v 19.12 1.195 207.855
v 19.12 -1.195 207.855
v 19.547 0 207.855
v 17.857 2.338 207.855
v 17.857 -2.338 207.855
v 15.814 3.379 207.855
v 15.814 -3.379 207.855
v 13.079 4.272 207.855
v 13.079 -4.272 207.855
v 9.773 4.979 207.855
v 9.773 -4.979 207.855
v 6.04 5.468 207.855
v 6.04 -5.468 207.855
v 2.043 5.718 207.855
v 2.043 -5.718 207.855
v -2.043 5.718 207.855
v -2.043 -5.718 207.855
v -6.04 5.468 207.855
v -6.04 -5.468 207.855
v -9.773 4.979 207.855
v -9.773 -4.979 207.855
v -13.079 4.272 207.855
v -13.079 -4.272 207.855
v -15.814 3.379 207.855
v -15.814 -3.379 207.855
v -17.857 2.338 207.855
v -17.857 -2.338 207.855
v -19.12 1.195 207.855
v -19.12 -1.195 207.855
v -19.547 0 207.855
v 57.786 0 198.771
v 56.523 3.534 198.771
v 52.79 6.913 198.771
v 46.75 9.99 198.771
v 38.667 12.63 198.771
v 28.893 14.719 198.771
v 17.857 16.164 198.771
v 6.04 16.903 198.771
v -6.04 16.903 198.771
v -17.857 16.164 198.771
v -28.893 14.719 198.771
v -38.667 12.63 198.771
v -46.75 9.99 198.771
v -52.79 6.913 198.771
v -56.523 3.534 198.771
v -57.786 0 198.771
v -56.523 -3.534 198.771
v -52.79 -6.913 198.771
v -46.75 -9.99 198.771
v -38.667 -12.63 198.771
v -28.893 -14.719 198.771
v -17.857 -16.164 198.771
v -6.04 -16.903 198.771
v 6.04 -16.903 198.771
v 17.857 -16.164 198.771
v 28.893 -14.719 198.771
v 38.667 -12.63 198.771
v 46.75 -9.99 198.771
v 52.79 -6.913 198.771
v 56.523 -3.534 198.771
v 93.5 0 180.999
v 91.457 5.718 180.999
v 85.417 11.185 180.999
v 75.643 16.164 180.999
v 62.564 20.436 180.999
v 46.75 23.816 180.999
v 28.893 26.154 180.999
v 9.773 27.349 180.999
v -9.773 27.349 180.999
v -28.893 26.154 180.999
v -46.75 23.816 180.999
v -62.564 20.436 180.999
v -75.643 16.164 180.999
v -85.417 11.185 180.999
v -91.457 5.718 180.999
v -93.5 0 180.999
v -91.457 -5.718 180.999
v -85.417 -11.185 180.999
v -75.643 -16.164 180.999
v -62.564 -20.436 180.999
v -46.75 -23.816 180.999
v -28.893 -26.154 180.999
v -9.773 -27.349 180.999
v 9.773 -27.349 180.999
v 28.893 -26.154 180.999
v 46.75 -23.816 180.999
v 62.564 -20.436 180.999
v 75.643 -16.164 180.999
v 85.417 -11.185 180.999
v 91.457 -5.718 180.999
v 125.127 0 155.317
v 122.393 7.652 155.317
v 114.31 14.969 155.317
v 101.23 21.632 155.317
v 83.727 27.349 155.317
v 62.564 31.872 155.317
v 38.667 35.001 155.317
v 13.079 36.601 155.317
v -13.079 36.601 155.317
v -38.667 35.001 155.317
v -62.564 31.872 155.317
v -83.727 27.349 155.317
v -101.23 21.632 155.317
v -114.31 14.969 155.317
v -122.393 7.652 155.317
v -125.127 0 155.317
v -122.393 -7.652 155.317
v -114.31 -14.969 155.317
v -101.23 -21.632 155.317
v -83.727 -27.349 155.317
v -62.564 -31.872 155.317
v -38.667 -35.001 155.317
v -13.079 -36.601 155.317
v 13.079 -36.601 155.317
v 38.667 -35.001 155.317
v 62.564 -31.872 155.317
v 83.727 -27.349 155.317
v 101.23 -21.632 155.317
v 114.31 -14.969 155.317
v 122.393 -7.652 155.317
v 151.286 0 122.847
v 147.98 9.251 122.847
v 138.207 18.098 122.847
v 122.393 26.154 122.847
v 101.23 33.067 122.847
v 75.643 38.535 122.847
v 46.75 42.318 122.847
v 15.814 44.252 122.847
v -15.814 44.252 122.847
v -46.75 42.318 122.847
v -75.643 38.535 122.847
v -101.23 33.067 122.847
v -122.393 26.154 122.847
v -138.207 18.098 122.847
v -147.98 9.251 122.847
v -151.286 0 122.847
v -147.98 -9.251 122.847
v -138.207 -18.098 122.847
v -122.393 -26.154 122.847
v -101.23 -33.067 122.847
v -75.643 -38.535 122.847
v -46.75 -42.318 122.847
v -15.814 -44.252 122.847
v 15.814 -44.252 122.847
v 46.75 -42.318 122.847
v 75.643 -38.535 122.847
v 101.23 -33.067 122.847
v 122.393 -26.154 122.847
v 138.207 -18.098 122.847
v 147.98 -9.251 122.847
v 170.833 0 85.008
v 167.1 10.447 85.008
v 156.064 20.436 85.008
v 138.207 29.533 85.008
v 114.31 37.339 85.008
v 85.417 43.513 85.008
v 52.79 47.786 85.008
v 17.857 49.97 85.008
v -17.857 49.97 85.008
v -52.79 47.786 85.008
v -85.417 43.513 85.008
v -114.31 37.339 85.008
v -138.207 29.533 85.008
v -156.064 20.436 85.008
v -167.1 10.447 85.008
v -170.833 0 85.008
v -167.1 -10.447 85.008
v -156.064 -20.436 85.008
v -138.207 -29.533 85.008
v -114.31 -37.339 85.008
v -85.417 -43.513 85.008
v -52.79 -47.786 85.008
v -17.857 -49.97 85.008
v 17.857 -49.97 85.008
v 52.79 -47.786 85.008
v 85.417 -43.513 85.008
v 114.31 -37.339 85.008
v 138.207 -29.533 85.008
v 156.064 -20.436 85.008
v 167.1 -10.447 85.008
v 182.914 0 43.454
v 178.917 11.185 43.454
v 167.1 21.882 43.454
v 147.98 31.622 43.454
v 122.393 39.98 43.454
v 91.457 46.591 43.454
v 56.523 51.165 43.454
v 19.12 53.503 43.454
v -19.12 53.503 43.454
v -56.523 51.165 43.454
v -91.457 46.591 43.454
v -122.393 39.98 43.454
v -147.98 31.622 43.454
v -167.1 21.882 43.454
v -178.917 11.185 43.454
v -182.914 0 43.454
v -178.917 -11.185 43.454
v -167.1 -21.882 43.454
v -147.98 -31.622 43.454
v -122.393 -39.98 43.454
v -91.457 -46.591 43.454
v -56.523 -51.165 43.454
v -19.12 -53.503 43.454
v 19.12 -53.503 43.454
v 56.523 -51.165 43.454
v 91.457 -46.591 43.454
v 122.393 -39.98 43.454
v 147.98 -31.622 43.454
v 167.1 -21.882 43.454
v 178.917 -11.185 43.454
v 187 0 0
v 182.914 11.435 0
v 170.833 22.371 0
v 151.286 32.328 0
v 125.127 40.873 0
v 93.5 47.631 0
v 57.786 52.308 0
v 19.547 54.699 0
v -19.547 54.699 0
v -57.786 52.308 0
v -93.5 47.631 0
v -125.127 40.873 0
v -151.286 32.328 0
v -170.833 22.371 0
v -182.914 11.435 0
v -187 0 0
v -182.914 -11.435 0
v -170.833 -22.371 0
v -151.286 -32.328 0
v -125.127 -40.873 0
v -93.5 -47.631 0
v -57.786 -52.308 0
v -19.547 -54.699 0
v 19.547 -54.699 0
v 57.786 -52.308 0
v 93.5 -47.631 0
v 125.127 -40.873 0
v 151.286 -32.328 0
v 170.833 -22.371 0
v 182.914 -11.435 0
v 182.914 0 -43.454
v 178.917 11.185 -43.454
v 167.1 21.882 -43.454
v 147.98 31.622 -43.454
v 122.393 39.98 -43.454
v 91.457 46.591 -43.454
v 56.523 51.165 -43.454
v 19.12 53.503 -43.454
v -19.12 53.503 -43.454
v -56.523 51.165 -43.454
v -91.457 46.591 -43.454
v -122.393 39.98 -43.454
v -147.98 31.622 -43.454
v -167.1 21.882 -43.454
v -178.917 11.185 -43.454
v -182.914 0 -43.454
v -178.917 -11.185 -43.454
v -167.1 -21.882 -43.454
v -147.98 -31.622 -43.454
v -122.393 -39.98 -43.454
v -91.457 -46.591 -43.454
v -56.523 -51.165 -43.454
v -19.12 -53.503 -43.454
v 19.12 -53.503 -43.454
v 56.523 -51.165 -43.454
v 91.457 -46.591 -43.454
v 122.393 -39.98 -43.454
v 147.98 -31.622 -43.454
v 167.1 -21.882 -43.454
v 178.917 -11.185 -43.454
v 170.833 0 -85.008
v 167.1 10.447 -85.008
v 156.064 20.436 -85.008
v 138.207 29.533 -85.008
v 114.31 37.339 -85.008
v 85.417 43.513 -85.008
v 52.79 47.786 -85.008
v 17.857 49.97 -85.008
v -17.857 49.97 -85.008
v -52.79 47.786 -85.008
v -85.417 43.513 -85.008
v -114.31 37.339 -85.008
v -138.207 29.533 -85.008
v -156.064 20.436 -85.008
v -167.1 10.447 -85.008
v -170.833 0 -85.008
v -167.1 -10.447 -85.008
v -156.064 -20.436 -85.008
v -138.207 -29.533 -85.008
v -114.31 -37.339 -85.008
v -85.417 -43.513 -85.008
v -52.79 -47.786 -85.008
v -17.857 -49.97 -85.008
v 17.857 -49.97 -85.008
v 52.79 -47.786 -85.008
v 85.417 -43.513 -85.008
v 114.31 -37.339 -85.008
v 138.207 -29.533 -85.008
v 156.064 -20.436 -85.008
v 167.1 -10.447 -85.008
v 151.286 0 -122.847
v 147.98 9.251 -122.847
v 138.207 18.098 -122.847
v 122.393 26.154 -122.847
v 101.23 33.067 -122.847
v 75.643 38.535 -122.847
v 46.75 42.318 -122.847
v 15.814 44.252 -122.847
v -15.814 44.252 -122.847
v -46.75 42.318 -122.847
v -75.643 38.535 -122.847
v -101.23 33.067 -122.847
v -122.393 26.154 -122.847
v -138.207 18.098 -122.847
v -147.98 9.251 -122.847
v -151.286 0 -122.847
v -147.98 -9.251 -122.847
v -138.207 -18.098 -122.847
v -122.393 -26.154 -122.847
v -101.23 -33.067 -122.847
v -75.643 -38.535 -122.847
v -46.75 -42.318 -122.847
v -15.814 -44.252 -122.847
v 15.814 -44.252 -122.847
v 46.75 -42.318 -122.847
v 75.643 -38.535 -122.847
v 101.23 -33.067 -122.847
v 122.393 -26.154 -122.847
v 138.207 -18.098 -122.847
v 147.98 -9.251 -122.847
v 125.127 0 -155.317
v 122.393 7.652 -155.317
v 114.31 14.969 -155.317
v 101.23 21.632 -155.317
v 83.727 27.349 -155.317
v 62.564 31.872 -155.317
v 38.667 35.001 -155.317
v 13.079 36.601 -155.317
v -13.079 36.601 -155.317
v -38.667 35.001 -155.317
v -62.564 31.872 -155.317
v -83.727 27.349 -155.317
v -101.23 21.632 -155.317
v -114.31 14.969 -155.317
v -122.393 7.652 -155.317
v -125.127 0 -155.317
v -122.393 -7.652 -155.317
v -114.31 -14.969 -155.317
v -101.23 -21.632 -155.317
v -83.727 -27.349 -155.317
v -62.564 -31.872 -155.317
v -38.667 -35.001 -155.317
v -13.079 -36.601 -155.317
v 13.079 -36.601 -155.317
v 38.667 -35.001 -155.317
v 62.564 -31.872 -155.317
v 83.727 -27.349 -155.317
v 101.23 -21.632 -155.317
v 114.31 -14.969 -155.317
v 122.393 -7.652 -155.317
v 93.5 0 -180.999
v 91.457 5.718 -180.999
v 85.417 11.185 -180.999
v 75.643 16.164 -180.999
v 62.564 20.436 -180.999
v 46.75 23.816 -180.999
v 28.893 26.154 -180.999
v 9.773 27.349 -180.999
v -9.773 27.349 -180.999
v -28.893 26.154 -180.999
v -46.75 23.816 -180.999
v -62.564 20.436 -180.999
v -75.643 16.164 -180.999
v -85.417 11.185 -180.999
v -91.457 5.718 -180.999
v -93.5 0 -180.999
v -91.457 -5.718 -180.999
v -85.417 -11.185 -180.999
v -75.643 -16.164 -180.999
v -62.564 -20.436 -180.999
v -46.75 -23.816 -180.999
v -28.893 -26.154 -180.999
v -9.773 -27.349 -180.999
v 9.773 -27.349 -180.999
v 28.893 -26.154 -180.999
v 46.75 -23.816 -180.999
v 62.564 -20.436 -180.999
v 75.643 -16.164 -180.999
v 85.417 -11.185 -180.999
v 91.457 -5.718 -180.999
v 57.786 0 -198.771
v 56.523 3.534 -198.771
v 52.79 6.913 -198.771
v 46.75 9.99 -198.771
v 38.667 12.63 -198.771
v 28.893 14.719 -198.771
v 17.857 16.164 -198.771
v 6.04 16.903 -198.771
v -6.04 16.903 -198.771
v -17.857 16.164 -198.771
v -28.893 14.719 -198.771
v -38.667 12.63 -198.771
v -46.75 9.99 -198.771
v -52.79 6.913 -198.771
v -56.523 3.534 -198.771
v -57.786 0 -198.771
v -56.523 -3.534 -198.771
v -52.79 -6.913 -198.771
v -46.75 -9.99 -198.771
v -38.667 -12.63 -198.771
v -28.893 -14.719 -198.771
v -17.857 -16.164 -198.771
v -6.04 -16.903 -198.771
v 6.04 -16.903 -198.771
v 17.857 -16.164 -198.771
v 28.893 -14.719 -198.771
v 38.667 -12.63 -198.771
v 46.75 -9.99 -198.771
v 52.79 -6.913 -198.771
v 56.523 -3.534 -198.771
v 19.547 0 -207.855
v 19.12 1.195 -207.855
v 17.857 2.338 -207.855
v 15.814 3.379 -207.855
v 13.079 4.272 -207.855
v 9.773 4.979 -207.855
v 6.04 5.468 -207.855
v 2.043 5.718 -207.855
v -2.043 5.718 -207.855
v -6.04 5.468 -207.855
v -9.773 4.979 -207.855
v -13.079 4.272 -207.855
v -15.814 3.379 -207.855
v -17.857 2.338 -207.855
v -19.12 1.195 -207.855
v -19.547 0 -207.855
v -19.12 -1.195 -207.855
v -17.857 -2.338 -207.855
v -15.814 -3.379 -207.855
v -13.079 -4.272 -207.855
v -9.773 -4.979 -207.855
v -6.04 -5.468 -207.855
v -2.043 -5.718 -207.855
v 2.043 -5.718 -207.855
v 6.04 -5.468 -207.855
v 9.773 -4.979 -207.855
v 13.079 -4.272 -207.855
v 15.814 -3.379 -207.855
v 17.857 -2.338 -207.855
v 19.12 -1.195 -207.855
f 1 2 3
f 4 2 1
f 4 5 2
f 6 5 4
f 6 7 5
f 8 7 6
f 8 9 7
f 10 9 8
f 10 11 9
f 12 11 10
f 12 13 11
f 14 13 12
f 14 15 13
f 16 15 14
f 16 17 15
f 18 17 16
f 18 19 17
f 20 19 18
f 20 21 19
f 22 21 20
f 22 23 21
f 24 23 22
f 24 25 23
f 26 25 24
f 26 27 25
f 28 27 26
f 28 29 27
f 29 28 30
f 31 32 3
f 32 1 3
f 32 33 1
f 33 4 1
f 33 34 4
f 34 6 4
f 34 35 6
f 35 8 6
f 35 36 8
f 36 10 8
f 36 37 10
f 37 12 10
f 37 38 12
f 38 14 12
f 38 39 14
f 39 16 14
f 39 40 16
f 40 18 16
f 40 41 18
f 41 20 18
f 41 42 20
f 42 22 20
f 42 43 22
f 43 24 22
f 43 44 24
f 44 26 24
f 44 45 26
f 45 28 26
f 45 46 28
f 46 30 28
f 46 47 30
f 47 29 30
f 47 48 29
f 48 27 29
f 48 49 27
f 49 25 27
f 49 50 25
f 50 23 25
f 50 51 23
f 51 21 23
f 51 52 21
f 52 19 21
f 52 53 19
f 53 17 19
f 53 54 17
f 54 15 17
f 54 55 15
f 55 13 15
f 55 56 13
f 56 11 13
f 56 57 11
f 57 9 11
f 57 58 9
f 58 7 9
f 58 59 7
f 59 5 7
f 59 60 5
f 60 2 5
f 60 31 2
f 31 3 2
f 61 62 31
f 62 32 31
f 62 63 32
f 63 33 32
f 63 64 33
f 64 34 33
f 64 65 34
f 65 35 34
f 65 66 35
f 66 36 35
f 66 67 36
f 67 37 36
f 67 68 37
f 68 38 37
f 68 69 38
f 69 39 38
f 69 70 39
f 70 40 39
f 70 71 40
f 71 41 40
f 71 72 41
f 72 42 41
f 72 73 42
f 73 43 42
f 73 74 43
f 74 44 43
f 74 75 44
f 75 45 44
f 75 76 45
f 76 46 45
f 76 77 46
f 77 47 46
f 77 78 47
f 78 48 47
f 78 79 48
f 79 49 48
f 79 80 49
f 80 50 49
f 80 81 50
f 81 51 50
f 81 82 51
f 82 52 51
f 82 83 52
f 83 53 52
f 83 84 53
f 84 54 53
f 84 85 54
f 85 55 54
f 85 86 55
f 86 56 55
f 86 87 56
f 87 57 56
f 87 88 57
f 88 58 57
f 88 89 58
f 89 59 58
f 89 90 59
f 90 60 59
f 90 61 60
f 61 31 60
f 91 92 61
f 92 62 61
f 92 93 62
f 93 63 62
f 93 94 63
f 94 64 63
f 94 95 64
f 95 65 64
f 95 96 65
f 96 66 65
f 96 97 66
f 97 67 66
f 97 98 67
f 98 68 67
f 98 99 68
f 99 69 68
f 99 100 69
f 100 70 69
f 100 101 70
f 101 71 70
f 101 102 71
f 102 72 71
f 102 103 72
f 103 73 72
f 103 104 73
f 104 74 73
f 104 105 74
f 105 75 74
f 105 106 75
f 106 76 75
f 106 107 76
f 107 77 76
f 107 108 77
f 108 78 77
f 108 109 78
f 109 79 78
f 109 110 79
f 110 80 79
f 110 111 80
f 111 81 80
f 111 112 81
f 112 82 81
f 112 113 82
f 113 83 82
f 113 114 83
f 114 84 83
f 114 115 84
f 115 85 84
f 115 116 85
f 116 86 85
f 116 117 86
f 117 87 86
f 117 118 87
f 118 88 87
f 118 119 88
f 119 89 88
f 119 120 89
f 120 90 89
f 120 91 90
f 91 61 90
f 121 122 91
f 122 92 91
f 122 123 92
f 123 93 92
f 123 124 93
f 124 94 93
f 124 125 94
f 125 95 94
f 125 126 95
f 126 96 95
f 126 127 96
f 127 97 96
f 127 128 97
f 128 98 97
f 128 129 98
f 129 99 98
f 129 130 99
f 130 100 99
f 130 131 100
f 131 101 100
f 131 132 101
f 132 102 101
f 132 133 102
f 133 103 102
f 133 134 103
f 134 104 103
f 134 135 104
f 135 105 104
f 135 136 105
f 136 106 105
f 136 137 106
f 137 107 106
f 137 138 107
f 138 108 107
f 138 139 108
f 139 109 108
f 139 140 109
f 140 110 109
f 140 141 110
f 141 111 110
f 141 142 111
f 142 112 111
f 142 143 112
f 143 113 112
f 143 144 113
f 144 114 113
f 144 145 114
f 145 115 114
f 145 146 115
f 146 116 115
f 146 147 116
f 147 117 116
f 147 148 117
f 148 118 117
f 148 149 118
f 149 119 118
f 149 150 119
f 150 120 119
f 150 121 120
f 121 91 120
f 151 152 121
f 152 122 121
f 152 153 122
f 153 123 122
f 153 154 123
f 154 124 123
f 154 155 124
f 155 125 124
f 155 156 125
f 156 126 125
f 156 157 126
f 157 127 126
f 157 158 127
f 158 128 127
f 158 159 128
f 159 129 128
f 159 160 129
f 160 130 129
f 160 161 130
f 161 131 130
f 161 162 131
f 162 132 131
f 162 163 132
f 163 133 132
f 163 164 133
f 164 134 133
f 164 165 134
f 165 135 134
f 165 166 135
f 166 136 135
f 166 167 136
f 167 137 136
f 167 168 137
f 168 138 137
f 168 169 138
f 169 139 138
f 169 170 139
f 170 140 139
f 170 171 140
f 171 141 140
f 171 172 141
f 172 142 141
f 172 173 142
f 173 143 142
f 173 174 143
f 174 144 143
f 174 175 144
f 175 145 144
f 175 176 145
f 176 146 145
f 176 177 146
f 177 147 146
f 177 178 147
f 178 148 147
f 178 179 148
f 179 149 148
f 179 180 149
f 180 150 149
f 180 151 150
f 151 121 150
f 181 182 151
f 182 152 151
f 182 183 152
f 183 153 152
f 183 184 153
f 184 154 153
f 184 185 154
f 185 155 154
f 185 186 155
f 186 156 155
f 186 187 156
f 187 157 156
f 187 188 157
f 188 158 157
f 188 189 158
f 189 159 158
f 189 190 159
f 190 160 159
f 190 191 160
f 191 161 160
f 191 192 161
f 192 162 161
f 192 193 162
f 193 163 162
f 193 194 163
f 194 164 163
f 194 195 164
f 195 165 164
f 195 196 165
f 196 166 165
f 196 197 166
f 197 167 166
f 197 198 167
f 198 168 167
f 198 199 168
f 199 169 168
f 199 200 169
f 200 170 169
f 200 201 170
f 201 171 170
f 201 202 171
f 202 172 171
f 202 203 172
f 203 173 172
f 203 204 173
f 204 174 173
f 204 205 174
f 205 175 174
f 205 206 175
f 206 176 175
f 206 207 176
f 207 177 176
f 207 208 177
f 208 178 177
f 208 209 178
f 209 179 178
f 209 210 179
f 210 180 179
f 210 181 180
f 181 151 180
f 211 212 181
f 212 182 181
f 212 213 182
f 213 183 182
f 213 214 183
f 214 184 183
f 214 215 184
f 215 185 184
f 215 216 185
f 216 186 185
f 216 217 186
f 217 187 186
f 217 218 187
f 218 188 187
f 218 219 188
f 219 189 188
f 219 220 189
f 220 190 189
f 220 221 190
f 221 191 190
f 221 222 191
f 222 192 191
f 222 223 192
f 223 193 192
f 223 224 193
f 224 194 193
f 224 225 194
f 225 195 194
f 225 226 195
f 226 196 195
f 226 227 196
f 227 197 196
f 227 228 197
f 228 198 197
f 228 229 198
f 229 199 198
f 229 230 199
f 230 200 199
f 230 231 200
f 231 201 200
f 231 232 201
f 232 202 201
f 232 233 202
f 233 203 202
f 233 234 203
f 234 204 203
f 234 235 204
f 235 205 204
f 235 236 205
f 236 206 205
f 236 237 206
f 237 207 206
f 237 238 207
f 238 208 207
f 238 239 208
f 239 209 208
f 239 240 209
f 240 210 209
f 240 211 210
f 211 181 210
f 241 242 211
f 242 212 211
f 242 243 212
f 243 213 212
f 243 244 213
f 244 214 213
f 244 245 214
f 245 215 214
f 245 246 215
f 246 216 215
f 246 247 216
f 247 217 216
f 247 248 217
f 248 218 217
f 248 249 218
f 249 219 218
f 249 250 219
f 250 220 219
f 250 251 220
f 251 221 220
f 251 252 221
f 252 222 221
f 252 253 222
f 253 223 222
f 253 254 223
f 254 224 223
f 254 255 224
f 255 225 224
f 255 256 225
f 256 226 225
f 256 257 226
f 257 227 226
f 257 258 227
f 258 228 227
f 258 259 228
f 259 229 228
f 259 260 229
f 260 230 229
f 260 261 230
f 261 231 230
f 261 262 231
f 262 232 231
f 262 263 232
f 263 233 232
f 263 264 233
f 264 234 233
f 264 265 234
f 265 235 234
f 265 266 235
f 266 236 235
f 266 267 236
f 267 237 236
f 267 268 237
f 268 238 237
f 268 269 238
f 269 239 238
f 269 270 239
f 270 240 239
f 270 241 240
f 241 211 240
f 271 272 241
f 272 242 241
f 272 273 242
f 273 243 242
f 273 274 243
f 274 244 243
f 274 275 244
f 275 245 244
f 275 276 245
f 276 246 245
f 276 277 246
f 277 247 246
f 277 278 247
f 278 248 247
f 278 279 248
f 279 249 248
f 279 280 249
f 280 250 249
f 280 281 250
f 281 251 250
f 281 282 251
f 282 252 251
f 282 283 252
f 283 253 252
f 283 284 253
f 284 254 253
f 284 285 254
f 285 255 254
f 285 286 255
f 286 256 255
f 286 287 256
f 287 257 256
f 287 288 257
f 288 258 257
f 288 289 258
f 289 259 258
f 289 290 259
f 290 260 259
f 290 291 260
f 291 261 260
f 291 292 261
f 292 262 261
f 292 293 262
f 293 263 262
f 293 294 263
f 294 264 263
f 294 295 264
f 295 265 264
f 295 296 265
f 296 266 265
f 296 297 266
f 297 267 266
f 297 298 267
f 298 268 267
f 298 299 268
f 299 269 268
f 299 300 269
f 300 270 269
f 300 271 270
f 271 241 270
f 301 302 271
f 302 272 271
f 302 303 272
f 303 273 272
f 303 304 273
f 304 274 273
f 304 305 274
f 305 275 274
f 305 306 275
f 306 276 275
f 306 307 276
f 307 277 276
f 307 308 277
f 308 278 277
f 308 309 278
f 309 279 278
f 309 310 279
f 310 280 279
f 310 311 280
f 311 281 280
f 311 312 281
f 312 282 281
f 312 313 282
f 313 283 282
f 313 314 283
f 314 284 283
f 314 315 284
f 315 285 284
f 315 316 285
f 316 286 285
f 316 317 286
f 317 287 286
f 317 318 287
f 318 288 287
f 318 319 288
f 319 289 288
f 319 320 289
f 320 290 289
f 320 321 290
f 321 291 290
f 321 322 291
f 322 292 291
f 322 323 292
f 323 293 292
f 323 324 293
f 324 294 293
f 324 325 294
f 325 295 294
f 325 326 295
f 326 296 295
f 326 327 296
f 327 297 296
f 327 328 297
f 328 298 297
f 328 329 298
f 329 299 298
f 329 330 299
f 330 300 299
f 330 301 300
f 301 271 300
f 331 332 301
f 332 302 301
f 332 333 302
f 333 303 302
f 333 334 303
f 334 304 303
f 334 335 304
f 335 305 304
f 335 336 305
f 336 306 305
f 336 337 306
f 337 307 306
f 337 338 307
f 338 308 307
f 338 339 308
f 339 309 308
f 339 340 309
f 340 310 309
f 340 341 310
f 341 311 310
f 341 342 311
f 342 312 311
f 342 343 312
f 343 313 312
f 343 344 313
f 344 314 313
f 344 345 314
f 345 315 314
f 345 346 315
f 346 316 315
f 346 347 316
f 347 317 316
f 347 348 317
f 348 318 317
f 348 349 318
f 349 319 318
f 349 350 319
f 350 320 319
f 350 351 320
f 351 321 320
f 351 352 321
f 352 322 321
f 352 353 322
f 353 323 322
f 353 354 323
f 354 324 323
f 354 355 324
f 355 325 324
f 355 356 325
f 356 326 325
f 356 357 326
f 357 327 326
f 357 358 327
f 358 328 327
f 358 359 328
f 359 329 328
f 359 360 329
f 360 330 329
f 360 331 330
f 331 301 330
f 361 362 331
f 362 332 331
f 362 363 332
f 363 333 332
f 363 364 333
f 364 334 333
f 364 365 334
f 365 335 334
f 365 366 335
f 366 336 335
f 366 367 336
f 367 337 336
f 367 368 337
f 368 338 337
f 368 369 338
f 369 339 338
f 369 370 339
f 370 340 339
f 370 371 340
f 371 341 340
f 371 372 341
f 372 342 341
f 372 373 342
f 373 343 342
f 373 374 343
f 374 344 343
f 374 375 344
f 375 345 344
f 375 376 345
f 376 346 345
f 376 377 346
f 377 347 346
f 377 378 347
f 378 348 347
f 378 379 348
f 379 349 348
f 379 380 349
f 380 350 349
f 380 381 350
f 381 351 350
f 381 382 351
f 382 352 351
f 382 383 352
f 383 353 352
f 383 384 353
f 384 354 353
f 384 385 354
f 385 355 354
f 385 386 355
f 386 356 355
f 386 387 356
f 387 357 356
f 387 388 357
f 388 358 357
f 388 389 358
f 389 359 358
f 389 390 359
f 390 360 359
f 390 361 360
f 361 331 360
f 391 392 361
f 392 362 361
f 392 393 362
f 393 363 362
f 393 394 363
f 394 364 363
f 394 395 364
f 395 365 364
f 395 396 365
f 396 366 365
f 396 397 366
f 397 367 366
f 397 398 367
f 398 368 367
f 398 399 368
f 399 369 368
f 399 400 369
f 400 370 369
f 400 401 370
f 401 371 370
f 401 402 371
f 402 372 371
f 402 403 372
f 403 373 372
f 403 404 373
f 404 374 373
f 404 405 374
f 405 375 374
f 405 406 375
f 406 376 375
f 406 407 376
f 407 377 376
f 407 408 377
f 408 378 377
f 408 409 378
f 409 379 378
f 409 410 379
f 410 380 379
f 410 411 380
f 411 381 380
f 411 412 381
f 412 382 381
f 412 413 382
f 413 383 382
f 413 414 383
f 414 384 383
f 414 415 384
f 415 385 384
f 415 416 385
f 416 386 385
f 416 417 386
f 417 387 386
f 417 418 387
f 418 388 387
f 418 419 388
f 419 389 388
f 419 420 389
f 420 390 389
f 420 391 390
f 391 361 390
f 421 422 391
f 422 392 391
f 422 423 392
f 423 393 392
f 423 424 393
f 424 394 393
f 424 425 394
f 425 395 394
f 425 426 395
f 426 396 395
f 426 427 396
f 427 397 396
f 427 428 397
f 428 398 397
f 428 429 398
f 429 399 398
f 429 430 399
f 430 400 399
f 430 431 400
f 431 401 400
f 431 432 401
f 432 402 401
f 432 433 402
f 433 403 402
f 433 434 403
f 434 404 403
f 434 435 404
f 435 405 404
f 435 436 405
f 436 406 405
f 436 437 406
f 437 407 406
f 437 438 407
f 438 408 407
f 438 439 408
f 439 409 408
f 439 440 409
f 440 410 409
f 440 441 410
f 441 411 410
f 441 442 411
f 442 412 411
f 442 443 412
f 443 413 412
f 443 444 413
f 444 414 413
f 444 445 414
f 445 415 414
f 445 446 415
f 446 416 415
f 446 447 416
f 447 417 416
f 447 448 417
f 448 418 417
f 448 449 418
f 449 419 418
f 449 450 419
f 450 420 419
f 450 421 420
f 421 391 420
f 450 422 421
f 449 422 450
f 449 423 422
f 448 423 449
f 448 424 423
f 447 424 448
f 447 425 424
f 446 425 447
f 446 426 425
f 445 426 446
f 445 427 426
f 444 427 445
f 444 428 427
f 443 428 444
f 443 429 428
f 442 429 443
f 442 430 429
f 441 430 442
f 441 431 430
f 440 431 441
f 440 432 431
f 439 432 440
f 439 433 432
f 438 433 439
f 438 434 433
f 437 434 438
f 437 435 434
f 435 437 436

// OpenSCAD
// Generated by SolidPython 1.0.1 on 2020-07-29 00:46:52


scale(v = [17, 5, 19]) {
	sphere(r = 11);
}
/***********************************************
*********      SolidPython code:      **********
************************************************
 
# import packages: SolidPython
from solid import *
from solid.utils import *
from itertools import chain, combinations, permutations


class Resize:

    def __init__(self, scad_file):
        self.scad_file = scad_file
        #self.scad_file = import_scad(scad_file)
        # cone/cylinder param:
        self.r1 = 0
        self.r2 = 0
        self.h = 0
        # rectangular prism param:
        self.w = 0
        self.l = 0
        # ellipse param:
        self.r = 0

    # import OpenScad code (file name corresponds to shape)


    # classify shape + parameters
    def assign(self, param1, param2, param3):
        if self.scad_file == 'cone.scad':
            self.r1 = param1
            self.r2 = param2
            self.h = param3
        elif self.scad_file == 'cylinder.scad':
            self.r1 = param1
            self.r2 = param2
            self.h = param3
        elif self.scad_file == 'rectangularPrism.scad':
            self.h = param1
            self.l = param2
            self.w = param3
        else:
            self.r = param1
            self.h = param2

    # resize parameters
    def iterate(self):
        x = range(3, 20, 2)
        i = 1
        if self.scad_file == 'cone.scad':
            tempList = list(permutations(x, 2))
            for temp in tempList:
                param1 = temp[0]
                param2 = temp[1]
                filepath = 'produced_scad_files/' + 'cone' + str(param1) + '_' + str(param2) + '_' + '.scad'
                scad_render_to_file(cylinder(h=param1, r1=param2, r2=0), filepath)

        elif self.scad_file == 'cylinder.scad':
            tempList = list(permutations(x, 3))
            for temp in tempList:
                param1 = temp[0]
                param2 = temp[1]
                filepath = 'produced_scad_files/' + 'cylinder' + str(param1) + '_' + str(param2) + '_' + '.scad'
                scad_render_to_file(cylinder(h=param1, r1=param2, r2=param2), filepath)

        elif self.scad_file == 'rectangularPrism.scad':
            tempList = list(permutations(x, 3))
            for temp in tempList:
                param1 = temp[0]
                param2 = temp[1]
                param3 = temp[2]
                filepath = 'produced_scad_files/' + 'rectangularPrism' + str(param1) + '_' + str(param2) + '_' + str(
                    param3) + '.scad'
                scad_render_to_file(cube(size=(param1, param2, param3)), filepath)

        elif self.scad_file == 'ellipse.scad':
            tempList = list(permutations(x, 4))
            for temp in tempList:
                param1 = temp[0]
                param2 = temp[1]
                param3 = temp[2]
                param4 = temp[3]
                filepath = 'produced_scad_files/' + 'ellipse' + str(param1) + '_' + str(param2) + '_' + str(param3) + '_' + str(param4) + '.scad'
                scad_render_to_file(scale([param1, param2, param3])(sphere(r=param4)), filepath)

    def render_to_scadfile(self):
        scad_render_to_file(scad, 'example.scad') 
 
************************************************/
